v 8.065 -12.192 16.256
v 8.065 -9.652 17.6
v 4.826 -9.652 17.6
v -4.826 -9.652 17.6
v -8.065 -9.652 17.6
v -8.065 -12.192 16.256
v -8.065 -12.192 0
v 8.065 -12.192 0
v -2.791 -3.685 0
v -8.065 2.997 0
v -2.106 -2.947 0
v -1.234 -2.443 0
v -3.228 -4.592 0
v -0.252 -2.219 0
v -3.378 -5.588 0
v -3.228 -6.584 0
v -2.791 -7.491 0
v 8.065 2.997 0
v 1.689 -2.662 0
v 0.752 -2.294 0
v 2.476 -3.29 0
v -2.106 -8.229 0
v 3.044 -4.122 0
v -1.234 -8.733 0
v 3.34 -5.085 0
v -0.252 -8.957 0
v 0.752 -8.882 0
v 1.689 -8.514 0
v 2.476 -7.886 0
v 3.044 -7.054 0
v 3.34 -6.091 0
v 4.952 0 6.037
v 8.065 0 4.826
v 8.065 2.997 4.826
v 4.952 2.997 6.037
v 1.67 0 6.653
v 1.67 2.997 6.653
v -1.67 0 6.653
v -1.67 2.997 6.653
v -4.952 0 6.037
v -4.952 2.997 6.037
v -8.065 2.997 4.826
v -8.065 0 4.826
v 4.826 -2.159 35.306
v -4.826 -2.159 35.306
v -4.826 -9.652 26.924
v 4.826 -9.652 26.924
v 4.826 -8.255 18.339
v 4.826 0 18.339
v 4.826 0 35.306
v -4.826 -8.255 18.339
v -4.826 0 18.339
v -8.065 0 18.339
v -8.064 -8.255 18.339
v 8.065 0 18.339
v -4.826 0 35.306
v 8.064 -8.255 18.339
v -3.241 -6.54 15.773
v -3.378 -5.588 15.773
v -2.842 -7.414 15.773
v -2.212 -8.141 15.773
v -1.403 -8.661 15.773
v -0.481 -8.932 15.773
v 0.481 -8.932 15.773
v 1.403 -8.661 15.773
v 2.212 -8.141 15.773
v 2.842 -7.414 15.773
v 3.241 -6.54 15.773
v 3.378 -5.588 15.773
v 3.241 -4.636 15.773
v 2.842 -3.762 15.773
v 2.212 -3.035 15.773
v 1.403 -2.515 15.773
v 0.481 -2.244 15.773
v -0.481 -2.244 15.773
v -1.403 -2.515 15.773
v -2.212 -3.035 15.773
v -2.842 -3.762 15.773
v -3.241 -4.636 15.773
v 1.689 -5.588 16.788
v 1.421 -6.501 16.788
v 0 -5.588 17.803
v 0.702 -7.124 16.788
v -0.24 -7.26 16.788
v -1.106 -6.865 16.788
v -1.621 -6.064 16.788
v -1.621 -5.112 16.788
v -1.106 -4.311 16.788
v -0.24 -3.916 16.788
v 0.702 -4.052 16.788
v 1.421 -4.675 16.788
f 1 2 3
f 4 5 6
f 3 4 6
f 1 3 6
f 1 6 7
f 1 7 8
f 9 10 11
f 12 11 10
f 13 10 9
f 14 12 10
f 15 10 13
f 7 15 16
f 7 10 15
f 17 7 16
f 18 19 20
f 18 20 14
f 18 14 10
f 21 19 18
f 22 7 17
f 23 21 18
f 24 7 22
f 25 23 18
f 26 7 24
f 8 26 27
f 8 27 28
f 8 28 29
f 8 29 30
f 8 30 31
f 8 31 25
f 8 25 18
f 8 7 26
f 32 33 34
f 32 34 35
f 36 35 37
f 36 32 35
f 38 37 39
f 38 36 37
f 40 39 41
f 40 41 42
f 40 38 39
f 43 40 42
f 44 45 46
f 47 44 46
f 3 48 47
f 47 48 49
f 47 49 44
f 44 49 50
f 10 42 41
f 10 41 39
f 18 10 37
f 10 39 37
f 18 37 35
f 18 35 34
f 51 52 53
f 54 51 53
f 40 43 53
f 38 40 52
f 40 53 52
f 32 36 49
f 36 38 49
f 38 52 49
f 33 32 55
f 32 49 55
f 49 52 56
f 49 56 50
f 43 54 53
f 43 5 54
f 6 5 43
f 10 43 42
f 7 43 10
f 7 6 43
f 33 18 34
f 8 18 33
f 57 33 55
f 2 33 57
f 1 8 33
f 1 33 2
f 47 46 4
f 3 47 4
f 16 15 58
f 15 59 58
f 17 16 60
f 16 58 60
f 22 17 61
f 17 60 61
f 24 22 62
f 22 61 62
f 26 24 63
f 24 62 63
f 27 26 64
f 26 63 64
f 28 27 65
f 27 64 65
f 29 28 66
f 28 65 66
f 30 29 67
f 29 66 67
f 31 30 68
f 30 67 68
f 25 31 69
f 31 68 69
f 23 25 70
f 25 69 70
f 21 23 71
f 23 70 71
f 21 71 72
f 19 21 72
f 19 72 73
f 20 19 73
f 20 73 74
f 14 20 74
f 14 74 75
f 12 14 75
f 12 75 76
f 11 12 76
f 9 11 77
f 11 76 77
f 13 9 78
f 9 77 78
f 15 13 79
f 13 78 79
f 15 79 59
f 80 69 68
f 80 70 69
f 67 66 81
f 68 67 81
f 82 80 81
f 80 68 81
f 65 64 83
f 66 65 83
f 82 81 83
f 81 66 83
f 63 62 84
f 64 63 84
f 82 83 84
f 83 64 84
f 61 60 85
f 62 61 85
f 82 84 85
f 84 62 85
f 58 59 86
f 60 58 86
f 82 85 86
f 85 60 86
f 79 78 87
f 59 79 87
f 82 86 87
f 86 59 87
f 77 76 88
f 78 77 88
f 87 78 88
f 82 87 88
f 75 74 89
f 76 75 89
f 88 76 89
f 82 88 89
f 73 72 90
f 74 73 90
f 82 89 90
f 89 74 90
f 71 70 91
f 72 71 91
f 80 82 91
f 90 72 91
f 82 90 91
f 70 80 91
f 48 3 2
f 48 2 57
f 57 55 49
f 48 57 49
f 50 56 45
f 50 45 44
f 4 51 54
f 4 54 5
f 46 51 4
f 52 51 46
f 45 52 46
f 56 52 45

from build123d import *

# Parameters (mm, degrees)
F0_W      = 9.652
F0_H      = 16.9672
F1_DEPTH  = 12.192
F2_DEPTH  = 2.9972
F4_DEPTH  = 25.4
F6_DEPTH  = 3.2385
F8_DEPTH  = 3.2385
F10_D     = 6.7564
F10_DEPTH = 15.7734
F10_TIP   = 2.0298273432


with BuildPart() as f1:
    # F0 (on Front) → F1 (new body)
    with BuildSketch(Plane.XZ):
        with Locations((0, 26.8224)):
            Rectangle(F0_W, F0_H)
        with BuildLine():
            Line((4.826, 18.3388), (-4.826, 18.3388))
            Line((-4.826, 18.3388), (-8.0645, 18.3388))
            Line((-8.0645, 18.3388), (-8.0645, 4.826))
            ThreePointArc((-8.0645, 4.826), (0, 6.731), (8.0645, 4.826))
            Line((8.0645, 4.826), (8.0645, 18.3388))
            Line((8.0645, 18.3388), (4.826, 18.3388))
        make_face()
        with BuildLine():
            ThreePointArc((8.0645, 4.826), (0, 6.731), (-8.0645, 4.826))
            Line((-8.0645, 4.826), (-8.0645, 0))
            Line((-8.0645, 0), (8.0645, 0))
            Line((8.0645, 0), (8.0645, 4.826))
        make_face()
    extrude(amount=F1_DEPTH)

    # F0 (on Front) → F2 (join)
    with BuildSketch(Plane.XZ):
        with BuildLine():
            ThreePointArc((8.0645, 4.826), (0, 6.731), (-8.0645, 4.826))
            Line((-8.0645, 4.826), (-8.0645, 0))
            Line((-8.0645, 0), (8.0645, 0))
            Line((8.0645, 0), (8.0645, 4.826))
        make_face()
    extrude(amount=-F2_DEPTH)

    # F3 (on face) → F4 (cut, symmetric)
    with BuildSketch(Plane(origin=(-4.826, 0, 0), x_dir=(0, -1, 0), z_dir=(-1, 0, 0))):
        Polygon((2.159, 37.6501940191), (2.159, 35.306), (9.652, 26.924), (9.652, 17.5997419355), (12.192, 16.256), (15.097416006, 16.256), (15.097416006, 26.924), (15.097416006, 37.6501940191), align=None)
    extrude(amount=F4_DEPTH, both=True, mode=Mode.SUBTRACT)

    # F5 (on face) → F6 (cut, through all)
    with BuildSketch(Plane(origin=(-4.826, 0, 0), x_dir=(0, -1, 0), z_dir=(-1, 0, 0))):
        Polygon((9.652, 17.5997419355), (9.652, 18.3388), (8.255, 18.3388), align=None)
    extrude(amount=F6_DEPTH, mode=Mode.SUBTRACT)

    # F7 (on face) → F8 (cut, through all)
    with BuildSketch(Plane.YZ.offset(4.826)):
        Polygon((-8.255, 18.3388), (-9.652, 18.3388), (-9.652, 17.5997419355), align=None)
    extrude(amount=F8_DEPTH, mode=Mode.SUBTRACT)

    # F10
    with Locations(Plane(origin=(0, 0, 0), x_dir=(1, 0, 0), z_dir=(0, 0, -1))):
        with Locations((0, 5.588)):
            Hole(F10_D / 2, depth=F10_DEPTH)
            with Locations((0, 0, -(F10_DEPTH + F10_TIP / 2))):  # 118° drill point
                Cone(0, F10_D / 2, F10_TIP, mode=Mode.SUBTRACT)


solid = f1.part
